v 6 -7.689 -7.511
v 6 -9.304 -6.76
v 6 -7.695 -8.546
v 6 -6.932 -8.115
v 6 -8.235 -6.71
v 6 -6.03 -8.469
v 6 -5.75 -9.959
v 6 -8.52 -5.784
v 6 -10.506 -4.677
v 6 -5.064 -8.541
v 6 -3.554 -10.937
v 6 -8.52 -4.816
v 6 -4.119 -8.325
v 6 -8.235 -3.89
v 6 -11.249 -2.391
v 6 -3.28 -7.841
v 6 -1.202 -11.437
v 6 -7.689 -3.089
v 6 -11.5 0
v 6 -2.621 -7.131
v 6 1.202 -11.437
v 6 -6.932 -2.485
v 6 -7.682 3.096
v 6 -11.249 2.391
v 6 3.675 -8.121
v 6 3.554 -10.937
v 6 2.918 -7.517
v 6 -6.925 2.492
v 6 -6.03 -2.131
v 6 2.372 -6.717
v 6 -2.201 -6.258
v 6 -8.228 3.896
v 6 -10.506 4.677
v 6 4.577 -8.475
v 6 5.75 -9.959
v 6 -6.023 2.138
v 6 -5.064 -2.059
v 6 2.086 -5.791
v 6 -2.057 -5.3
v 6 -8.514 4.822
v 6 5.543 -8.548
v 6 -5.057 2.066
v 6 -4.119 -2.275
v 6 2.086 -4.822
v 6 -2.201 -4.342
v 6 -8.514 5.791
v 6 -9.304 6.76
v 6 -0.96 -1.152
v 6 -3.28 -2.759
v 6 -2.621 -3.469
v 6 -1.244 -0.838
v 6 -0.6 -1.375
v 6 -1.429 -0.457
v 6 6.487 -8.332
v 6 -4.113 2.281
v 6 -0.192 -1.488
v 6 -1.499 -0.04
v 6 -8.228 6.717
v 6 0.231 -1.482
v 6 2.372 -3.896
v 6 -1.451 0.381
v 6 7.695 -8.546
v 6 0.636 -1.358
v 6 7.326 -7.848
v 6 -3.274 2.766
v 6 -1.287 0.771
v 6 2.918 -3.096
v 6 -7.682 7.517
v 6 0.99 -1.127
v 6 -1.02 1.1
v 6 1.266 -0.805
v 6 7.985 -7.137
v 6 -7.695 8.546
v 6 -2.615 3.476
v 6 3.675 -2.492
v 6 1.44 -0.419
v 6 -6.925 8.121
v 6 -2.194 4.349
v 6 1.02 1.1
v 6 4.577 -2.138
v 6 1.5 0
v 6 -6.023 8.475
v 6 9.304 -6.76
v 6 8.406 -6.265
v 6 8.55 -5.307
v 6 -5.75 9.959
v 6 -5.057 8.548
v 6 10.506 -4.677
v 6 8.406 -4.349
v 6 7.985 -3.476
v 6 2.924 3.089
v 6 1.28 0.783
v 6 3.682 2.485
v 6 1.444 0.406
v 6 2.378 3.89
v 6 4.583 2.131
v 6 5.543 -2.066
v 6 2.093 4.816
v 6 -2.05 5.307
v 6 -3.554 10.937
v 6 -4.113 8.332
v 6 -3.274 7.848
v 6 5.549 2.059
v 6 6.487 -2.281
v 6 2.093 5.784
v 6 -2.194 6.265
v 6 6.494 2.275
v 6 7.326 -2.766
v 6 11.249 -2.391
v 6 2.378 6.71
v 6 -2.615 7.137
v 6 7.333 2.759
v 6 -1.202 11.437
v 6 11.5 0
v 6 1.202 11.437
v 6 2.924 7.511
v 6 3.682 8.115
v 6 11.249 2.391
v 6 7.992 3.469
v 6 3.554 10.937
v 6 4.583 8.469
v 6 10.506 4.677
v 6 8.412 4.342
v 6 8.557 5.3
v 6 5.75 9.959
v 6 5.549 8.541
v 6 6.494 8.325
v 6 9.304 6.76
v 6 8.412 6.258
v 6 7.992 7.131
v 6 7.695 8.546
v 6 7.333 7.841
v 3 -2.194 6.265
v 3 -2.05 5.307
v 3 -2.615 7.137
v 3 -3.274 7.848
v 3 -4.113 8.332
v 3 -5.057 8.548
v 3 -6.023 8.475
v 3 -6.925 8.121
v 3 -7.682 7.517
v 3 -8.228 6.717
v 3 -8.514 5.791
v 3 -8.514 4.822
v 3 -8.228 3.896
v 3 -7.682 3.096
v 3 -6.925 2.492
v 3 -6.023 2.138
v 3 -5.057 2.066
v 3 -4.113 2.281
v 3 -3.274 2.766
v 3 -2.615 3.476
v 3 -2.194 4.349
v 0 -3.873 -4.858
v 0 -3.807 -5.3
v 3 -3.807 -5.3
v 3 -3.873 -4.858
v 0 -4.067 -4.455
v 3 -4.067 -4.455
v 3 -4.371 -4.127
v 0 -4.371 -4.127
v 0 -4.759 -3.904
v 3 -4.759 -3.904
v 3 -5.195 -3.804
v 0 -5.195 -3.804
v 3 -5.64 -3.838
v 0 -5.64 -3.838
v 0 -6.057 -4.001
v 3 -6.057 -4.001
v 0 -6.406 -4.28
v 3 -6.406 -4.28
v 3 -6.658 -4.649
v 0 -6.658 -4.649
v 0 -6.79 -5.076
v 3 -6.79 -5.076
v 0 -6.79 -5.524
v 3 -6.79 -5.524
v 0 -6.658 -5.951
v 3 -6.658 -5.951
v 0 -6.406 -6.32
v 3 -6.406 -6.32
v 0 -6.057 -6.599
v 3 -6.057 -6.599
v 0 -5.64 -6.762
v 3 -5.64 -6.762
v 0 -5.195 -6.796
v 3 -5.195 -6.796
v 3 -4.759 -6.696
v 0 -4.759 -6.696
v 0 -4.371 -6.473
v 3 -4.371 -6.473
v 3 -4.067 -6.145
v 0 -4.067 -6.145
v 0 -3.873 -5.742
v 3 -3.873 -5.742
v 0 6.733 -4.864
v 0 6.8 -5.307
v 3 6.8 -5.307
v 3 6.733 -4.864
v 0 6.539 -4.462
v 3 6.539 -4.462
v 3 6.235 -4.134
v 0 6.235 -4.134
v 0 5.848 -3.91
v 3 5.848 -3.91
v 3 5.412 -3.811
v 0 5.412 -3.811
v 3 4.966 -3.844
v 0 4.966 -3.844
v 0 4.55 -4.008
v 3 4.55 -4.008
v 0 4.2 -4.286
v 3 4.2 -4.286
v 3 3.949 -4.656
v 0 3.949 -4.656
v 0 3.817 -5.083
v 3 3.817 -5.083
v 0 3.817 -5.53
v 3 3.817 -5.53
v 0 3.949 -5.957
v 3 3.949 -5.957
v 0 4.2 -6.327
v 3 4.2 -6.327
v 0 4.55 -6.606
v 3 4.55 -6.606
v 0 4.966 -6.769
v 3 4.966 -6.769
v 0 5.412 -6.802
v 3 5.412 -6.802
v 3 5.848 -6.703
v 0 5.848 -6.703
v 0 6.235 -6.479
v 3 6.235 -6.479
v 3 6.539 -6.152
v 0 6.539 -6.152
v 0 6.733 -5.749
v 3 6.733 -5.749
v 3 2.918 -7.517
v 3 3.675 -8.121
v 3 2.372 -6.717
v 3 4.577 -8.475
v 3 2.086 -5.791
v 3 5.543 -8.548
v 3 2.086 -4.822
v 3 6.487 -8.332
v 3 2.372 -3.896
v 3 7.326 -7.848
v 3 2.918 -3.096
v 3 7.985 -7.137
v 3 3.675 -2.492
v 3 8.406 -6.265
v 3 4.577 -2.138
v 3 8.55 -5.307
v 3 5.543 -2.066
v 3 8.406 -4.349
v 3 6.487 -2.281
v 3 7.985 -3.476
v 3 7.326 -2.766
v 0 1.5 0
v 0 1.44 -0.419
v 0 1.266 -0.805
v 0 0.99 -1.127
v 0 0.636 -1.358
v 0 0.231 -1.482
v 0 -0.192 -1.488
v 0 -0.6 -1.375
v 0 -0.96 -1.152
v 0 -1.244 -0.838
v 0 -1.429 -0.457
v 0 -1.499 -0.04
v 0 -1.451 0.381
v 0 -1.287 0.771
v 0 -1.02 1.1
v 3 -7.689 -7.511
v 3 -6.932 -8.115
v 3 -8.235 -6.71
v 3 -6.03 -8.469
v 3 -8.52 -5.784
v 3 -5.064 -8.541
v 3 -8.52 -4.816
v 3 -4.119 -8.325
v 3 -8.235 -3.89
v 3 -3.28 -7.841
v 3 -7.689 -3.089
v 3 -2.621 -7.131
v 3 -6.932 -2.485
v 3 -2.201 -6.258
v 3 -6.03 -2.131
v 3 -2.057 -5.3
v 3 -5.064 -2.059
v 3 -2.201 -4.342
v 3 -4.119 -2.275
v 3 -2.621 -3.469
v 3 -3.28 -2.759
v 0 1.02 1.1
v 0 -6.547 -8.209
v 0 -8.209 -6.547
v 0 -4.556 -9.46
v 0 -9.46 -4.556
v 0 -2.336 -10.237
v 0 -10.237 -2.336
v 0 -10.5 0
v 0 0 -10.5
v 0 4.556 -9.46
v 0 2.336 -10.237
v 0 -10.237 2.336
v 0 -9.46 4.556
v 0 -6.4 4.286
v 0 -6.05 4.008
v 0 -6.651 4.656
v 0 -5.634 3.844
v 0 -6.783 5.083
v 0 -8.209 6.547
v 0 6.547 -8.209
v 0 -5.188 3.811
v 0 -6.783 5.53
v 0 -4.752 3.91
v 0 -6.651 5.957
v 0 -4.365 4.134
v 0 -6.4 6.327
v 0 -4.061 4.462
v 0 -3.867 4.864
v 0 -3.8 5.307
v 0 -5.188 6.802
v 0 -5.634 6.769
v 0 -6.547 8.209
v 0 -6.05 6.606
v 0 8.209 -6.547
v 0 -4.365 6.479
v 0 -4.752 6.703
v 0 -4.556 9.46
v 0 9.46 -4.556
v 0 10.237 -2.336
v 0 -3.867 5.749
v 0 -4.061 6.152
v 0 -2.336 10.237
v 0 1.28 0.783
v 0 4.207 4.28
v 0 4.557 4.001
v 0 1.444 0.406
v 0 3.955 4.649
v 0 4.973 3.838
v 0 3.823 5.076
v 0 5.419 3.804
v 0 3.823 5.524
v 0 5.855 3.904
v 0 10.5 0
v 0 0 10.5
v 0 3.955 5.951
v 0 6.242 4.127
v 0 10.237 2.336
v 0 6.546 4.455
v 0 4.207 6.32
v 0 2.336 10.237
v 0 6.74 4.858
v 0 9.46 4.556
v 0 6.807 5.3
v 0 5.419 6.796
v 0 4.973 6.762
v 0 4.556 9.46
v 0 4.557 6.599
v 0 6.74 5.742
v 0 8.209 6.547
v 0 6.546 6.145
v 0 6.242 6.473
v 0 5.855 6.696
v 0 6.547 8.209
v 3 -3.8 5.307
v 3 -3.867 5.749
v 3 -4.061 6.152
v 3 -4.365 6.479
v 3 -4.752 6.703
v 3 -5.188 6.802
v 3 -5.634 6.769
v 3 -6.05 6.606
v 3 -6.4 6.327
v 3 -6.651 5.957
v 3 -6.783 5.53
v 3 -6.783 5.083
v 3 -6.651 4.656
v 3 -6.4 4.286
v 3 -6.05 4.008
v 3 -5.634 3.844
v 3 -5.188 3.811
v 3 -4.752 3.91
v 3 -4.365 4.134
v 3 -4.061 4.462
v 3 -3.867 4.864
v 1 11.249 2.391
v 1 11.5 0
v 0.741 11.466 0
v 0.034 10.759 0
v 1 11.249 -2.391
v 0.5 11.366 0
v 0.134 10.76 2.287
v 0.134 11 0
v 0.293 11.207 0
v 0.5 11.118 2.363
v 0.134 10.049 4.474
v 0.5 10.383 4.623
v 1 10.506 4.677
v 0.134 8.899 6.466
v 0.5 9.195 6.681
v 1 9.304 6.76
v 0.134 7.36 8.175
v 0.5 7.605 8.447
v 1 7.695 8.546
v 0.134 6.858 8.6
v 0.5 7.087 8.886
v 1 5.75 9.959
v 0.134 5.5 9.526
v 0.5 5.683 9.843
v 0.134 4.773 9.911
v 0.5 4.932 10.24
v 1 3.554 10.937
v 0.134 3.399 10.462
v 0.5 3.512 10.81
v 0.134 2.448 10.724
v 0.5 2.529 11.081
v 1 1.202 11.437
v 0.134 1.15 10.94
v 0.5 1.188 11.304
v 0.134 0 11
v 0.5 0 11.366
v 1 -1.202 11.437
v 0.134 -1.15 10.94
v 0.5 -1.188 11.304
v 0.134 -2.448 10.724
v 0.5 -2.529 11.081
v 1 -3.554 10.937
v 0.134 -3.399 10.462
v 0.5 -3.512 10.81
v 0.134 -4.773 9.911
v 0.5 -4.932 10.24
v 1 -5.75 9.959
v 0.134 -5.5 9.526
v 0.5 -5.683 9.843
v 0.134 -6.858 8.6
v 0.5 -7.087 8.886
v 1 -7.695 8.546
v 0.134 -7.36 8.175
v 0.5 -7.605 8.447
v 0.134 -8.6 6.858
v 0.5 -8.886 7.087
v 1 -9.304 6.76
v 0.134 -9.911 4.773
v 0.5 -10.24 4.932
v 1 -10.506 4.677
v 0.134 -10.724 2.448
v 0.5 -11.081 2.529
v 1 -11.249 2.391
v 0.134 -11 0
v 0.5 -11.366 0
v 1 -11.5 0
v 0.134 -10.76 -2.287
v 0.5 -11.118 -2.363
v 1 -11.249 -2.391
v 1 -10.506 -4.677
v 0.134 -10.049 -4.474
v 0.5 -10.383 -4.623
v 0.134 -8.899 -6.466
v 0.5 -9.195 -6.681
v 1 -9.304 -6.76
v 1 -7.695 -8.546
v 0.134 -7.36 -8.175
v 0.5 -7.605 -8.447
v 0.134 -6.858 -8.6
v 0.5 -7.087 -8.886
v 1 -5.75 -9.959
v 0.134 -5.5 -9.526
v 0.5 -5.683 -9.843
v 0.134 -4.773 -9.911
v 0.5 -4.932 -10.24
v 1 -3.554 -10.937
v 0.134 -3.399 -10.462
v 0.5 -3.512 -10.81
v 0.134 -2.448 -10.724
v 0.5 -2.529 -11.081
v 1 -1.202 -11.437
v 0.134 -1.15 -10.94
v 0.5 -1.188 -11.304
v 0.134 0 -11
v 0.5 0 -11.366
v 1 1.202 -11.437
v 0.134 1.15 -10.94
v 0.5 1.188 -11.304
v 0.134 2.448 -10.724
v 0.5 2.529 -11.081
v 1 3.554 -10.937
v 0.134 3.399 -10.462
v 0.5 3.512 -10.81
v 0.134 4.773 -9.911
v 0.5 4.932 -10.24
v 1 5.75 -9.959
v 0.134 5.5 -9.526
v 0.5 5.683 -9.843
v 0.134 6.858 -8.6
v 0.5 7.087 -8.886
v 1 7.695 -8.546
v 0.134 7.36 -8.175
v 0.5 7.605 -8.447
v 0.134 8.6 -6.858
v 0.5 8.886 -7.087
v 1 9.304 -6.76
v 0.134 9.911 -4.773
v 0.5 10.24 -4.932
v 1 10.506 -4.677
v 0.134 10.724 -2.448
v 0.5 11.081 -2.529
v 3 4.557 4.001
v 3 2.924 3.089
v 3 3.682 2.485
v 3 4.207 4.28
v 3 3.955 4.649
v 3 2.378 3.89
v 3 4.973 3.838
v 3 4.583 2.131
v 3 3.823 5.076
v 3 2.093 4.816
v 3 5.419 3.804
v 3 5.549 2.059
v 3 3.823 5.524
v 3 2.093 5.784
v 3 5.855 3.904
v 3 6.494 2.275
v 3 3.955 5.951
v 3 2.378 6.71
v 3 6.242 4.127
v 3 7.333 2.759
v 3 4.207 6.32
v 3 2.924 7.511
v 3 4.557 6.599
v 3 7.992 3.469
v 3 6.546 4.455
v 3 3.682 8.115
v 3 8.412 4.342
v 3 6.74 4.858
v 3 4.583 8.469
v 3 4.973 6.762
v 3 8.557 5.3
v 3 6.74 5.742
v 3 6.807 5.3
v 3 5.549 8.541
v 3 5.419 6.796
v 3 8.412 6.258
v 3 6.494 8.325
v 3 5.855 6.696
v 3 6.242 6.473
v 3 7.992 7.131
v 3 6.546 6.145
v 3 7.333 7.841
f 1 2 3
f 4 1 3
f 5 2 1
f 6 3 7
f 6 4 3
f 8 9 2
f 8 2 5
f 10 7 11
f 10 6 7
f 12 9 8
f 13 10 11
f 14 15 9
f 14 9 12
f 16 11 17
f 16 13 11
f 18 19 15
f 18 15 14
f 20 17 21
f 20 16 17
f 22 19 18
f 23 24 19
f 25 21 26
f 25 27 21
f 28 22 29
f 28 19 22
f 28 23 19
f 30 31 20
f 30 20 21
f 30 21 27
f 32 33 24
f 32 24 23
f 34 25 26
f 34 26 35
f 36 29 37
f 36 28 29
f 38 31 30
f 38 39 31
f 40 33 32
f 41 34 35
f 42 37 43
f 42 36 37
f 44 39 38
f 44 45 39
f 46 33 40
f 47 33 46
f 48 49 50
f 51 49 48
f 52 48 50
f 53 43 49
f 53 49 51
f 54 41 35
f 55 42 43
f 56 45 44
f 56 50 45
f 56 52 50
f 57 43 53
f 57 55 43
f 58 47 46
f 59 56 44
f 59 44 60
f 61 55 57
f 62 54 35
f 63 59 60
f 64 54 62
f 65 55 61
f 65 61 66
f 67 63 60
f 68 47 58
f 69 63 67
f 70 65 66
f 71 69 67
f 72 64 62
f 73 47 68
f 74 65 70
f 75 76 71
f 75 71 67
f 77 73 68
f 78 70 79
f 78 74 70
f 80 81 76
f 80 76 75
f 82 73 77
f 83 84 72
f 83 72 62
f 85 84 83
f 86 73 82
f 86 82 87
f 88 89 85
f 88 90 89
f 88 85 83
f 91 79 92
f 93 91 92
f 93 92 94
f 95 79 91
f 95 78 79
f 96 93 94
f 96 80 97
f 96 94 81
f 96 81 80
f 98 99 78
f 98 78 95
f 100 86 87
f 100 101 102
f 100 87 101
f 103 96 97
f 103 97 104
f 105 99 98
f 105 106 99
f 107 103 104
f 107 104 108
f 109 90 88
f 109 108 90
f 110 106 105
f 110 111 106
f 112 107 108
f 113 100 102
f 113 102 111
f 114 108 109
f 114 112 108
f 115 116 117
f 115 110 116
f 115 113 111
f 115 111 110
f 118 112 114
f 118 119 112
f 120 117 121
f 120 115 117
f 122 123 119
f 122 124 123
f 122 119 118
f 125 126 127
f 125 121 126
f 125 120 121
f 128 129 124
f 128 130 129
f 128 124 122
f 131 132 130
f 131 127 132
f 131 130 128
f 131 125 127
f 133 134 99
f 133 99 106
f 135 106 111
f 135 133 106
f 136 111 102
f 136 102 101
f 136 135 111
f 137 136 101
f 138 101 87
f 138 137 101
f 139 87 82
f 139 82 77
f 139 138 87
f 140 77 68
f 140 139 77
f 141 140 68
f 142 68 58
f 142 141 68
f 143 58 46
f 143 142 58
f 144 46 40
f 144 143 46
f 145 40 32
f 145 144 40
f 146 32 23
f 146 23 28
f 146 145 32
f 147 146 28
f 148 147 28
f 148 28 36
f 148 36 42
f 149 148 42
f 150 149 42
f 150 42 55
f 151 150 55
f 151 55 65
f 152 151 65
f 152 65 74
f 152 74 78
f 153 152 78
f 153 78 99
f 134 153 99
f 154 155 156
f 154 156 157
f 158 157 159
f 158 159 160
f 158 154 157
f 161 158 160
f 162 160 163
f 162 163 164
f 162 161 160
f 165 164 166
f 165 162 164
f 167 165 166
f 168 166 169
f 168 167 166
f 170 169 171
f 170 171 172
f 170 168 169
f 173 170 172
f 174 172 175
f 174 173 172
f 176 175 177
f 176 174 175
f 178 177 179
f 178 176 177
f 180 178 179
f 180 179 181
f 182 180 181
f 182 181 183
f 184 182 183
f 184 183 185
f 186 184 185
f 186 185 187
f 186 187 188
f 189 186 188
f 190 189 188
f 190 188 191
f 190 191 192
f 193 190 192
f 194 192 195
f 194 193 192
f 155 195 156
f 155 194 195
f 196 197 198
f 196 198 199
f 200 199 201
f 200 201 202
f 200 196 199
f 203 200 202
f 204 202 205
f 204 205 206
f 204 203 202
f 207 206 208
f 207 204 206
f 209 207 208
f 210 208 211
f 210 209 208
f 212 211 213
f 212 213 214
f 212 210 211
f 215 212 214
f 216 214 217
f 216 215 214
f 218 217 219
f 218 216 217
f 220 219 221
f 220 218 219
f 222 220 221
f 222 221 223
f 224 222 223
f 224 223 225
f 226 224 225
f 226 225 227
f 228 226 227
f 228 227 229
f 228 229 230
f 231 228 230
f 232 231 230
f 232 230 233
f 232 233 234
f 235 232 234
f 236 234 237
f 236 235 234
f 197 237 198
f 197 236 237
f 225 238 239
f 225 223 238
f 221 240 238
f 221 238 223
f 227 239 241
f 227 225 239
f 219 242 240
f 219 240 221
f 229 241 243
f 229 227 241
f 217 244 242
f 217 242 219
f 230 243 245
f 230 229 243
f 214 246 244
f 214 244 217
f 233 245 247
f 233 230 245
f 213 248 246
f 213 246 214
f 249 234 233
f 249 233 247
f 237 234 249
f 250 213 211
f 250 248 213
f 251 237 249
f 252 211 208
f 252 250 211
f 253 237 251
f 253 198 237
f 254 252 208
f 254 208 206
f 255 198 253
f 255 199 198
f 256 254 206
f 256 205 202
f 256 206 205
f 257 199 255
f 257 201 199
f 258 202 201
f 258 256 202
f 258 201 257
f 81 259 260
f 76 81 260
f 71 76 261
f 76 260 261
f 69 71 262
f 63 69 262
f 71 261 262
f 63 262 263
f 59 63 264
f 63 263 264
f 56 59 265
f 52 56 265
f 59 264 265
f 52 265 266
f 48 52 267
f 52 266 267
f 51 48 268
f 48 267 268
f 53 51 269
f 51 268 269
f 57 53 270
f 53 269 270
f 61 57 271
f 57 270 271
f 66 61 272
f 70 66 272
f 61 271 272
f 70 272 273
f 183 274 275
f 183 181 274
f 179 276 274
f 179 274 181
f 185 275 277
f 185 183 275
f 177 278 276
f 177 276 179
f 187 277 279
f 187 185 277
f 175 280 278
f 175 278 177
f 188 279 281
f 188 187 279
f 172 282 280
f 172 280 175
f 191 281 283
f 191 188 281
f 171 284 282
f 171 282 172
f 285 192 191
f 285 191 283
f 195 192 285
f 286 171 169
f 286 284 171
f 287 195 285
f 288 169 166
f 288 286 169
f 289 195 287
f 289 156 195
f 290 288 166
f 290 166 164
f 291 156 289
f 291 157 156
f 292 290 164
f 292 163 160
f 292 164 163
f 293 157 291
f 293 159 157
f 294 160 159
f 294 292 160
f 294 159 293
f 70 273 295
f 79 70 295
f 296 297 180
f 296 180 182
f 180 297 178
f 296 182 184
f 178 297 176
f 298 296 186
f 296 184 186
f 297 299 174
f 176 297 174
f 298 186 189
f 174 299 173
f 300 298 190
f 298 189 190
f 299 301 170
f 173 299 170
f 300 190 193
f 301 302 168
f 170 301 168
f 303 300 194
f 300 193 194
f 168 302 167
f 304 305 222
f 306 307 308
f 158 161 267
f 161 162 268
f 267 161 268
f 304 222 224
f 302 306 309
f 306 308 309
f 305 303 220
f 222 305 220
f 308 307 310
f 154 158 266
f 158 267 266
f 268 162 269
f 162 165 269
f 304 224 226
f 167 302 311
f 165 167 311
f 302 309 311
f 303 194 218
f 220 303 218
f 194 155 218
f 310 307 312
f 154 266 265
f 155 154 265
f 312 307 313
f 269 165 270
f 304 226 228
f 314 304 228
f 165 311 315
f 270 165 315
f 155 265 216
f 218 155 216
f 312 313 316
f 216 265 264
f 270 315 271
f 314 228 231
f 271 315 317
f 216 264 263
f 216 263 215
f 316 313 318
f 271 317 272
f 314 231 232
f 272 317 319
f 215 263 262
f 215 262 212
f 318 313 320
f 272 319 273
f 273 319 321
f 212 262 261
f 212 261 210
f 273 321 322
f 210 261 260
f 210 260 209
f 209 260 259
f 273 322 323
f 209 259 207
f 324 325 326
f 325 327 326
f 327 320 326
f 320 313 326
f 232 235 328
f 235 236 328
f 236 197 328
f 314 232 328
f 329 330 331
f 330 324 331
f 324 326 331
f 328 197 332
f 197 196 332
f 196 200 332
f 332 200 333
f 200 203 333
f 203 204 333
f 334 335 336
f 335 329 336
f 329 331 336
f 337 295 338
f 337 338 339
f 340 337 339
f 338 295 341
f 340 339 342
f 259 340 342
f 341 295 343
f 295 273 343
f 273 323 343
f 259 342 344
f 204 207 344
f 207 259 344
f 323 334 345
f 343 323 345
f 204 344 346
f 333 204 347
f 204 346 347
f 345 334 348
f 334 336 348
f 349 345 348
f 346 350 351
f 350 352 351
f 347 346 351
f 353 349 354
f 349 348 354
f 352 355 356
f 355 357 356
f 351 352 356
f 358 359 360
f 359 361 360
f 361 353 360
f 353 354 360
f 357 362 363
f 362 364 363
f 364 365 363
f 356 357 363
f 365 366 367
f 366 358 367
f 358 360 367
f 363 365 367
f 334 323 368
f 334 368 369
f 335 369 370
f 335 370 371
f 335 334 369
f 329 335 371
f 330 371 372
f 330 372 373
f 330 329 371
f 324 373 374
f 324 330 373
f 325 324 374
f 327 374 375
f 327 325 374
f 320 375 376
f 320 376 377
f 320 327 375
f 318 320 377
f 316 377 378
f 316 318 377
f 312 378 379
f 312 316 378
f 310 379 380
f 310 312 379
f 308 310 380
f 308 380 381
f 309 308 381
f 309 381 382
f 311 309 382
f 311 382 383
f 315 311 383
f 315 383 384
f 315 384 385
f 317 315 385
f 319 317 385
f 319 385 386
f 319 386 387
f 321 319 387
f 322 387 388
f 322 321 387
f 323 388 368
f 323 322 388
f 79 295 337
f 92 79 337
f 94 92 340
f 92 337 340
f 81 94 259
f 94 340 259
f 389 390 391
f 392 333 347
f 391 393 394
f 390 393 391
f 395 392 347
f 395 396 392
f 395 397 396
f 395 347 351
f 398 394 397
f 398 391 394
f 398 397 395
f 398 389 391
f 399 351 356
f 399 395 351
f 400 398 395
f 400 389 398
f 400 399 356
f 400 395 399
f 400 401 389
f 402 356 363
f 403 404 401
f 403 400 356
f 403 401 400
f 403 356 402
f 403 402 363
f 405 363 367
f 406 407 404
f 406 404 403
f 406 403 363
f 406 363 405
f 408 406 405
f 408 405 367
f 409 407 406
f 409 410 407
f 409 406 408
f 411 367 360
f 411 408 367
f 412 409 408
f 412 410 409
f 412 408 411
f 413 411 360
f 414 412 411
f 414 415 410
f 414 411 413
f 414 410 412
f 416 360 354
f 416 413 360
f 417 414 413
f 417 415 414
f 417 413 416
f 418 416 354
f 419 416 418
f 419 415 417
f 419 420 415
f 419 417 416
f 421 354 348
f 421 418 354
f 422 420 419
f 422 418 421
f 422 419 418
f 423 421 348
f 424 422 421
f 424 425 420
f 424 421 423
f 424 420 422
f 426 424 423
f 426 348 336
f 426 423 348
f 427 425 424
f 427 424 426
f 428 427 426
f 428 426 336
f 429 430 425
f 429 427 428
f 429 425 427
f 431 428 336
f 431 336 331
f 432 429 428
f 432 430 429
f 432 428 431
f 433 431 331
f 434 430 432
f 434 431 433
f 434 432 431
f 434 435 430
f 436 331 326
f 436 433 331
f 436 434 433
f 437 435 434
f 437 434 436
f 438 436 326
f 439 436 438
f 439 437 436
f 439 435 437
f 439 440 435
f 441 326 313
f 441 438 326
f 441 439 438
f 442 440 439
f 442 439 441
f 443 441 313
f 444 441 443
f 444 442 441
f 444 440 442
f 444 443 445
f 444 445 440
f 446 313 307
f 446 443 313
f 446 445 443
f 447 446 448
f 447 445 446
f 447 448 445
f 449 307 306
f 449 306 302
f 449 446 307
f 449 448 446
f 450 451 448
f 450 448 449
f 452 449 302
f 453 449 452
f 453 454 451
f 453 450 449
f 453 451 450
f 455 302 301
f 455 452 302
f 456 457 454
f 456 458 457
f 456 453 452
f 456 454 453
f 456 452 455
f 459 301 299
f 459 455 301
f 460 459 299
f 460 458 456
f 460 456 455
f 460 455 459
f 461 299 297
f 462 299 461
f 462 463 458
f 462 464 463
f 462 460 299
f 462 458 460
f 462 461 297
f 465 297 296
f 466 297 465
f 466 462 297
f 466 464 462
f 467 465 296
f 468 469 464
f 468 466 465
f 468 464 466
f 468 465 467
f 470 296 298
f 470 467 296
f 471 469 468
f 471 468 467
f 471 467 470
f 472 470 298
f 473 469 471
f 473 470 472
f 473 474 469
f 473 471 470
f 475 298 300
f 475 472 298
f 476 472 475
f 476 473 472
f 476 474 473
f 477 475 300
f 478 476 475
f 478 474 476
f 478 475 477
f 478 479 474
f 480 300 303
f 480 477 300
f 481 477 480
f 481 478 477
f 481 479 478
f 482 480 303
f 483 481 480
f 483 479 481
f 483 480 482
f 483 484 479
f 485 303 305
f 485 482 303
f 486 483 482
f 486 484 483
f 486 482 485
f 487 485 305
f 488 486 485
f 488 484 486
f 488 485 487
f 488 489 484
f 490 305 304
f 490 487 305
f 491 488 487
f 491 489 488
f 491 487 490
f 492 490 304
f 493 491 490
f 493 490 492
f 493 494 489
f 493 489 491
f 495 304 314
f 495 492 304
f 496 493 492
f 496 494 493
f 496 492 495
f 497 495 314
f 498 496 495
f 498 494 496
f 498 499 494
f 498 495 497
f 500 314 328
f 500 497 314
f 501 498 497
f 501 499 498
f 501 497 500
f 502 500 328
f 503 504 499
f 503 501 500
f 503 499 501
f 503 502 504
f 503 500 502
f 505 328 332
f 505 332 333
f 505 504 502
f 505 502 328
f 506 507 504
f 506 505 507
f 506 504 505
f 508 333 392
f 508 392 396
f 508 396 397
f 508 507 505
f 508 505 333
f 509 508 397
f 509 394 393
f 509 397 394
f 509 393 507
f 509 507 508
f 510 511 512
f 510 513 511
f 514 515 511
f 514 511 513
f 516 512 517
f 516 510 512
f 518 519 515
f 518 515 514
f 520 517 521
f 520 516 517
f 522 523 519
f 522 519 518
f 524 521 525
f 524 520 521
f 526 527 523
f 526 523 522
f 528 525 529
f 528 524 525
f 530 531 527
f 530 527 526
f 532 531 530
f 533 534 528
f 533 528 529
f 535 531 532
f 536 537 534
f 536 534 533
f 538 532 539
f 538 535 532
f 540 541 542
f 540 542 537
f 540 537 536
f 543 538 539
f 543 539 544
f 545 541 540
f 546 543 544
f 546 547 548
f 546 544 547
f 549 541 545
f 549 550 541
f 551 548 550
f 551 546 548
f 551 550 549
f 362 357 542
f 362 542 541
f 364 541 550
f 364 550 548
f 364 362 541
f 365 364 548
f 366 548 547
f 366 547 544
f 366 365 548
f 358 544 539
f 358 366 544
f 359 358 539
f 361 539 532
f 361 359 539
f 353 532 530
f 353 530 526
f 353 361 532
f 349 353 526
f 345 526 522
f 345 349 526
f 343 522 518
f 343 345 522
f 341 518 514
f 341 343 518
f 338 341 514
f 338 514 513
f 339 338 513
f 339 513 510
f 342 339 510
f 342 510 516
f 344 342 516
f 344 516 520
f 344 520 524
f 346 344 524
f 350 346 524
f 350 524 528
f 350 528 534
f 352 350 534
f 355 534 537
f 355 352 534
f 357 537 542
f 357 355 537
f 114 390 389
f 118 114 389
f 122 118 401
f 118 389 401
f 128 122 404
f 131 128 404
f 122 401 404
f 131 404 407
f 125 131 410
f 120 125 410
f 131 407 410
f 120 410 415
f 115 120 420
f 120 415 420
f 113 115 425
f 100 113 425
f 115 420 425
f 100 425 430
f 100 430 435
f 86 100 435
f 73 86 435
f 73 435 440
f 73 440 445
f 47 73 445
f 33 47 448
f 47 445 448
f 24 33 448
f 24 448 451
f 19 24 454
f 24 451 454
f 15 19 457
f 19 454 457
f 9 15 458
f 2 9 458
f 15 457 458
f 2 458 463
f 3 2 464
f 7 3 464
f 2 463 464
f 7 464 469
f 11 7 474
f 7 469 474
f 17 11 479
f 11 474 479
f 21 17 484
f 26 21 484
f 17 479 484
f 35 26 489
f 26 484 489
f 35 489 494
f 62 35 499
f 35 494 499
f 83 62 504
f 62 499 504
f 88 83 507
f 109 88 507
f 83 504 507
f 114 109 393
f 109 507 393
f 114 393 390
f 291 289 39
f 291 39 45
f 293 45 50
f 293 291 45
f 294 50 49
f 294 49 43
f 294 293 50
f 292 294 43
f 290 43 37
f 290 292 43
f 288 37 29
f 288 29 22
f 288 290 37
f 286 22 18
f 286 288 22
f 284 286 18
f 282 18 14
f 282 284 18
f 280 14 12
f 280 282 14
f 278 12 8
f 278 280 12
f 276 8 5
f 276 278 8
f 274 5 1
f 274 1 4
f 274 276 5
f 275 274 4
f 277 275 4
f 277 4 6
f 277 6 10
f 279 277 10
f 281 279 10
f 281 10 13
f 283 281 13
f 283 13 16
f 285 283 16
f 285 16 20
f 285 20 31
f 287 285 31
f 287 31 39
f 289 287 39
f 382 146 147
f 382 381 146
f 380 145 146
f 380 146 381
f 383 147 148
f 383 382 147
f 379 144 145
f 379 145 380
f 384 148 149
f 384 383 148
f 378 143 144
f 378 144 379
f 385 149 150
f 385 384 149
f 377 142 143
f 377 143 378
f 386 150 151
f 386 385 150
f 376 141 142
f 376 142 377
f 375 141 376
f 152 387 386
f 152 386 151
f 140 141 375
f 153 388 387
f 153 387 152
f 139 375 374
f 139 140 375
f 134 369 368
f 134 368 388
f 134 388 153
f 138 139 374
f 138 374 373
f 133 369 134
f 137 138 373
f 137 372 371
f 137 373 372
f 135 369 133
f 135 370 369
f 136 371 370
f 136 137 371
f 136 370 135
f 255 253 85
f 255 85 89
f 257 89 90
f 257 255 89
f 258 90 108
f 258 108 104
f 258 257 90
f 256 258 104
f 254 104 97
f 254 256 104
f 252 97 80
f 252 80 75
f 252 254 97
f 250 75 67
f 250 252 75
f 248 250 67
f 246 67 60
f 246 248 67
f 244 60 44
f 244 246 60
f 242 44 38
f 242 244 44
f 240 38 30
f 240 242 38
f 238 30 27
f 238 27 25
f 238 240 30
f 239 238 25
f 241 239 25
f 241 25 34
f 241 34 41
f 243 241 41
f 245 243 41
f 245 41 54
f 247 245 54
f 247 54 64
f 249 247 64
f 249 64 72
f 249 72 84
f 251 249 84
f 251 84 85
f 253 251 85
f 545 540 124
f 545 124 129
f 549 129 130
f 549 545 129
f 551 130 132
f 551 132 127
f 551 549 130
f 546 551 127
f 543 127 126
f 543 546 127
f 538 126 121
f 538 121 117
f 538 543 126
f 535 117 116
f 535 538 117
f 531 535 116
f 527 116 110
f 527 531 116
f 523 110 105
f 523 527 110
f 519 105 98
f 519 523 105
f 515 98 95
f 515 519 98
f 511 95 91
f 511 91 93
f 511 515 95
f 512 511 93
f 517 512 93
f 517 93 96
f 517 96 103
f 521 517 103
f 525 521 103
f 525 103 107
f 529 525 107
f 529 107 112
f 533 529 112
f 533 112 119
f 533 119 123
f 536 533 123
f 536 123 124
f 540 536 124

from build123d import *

# Parameters (mm, degrees)
F0_R     = 11.5
F0_R_2   = 3.25
F1_DEPTH = 6
F0_R_3   = 1.5
F2_DEPTH = 3
F3_R     = 1


with BuildPart() as f1:
    # F0 (on Right) → F1 (new body)
    with BuildSketch(Plane.YZ):
        Circle(F0_R)
        with Locations((-5.3066, -5.3)):
            Circle(F0_R_2, mode=Mode.SUBTRACT)
        with Locations((5.3, -5.3066)):
            Circle(F0_R_2, mode=Mode.SUBTRACT)
        with Locations((-5.3, 5.3066)):
            Circle(F0_R_2, mode=Mode.SUBTRACT)
        with BuildLine():
            ThreePointArc((1.019757, 1.100043), (1.374706, 0.600152), (1.5, 0))
            ThreePointArc((1.5, 0), (-0.600093, -1.374732), (-1.019851, 1.099957))
            ThreePointArc((-1.019851, 1.099957), (-6.4e-05, 1.5), (1.019757, 1.100043))
        make_face(mode=Mode.SUBTRACT)
        with Locations((5.3066, 5.3)):
            Circle(F0_R_2, mode=Mode.SUBTRACT)
        with BuildLine():
            Line((-1.019851, 1.099957), (1.019757, 1.100043))
            ThreePointArc((1.019757, 1.100043), (-6.4e-05, 1.5), (-1.019851, 1.099957))
        make_face()
    extrude(amount=F1_DEPTH)

    # F0 (on Right) → F2 (join)
    with BuildSketch(Plane.YZ):
        with Locations((5.3066, 5.3)):
            Circle(F0_R_2)
        with Locations((5.3066, 5.3)):
            Circle(F0_R_3, mode=Mode.SUBTRACT)
        with Locations((-5.3066, -5.3)):
            Circle(F0_R_2)
        with Locations((-5.3066, -5.3)):
            Circle(F0_R_3, mode=Mode.SUBTRACT)
        with Locations((5.3, -5.3066)):
            Circle(F0_R_2)
        with Locations((5.3, -5.3066)):
            Circle(F0_R_3, mode=Mode.SUBTRACT)
        with Locations((-5.3, 5.3066)):
            Circle(F0_R_2)
        with Locations((-5.3, 5.3066)):
            Circle(F0_R_3, mode=Mode.SUBTRACT)
    extrude(amount=F2_DEPTH)

    # F3
    f3_edges = [f1.edges().sort_by_distance(p)[0] for p in [
        (0, -11.5, 0),
    ]]
    fillet(f3_edges, radius=F3_R)


solid = f1.part
